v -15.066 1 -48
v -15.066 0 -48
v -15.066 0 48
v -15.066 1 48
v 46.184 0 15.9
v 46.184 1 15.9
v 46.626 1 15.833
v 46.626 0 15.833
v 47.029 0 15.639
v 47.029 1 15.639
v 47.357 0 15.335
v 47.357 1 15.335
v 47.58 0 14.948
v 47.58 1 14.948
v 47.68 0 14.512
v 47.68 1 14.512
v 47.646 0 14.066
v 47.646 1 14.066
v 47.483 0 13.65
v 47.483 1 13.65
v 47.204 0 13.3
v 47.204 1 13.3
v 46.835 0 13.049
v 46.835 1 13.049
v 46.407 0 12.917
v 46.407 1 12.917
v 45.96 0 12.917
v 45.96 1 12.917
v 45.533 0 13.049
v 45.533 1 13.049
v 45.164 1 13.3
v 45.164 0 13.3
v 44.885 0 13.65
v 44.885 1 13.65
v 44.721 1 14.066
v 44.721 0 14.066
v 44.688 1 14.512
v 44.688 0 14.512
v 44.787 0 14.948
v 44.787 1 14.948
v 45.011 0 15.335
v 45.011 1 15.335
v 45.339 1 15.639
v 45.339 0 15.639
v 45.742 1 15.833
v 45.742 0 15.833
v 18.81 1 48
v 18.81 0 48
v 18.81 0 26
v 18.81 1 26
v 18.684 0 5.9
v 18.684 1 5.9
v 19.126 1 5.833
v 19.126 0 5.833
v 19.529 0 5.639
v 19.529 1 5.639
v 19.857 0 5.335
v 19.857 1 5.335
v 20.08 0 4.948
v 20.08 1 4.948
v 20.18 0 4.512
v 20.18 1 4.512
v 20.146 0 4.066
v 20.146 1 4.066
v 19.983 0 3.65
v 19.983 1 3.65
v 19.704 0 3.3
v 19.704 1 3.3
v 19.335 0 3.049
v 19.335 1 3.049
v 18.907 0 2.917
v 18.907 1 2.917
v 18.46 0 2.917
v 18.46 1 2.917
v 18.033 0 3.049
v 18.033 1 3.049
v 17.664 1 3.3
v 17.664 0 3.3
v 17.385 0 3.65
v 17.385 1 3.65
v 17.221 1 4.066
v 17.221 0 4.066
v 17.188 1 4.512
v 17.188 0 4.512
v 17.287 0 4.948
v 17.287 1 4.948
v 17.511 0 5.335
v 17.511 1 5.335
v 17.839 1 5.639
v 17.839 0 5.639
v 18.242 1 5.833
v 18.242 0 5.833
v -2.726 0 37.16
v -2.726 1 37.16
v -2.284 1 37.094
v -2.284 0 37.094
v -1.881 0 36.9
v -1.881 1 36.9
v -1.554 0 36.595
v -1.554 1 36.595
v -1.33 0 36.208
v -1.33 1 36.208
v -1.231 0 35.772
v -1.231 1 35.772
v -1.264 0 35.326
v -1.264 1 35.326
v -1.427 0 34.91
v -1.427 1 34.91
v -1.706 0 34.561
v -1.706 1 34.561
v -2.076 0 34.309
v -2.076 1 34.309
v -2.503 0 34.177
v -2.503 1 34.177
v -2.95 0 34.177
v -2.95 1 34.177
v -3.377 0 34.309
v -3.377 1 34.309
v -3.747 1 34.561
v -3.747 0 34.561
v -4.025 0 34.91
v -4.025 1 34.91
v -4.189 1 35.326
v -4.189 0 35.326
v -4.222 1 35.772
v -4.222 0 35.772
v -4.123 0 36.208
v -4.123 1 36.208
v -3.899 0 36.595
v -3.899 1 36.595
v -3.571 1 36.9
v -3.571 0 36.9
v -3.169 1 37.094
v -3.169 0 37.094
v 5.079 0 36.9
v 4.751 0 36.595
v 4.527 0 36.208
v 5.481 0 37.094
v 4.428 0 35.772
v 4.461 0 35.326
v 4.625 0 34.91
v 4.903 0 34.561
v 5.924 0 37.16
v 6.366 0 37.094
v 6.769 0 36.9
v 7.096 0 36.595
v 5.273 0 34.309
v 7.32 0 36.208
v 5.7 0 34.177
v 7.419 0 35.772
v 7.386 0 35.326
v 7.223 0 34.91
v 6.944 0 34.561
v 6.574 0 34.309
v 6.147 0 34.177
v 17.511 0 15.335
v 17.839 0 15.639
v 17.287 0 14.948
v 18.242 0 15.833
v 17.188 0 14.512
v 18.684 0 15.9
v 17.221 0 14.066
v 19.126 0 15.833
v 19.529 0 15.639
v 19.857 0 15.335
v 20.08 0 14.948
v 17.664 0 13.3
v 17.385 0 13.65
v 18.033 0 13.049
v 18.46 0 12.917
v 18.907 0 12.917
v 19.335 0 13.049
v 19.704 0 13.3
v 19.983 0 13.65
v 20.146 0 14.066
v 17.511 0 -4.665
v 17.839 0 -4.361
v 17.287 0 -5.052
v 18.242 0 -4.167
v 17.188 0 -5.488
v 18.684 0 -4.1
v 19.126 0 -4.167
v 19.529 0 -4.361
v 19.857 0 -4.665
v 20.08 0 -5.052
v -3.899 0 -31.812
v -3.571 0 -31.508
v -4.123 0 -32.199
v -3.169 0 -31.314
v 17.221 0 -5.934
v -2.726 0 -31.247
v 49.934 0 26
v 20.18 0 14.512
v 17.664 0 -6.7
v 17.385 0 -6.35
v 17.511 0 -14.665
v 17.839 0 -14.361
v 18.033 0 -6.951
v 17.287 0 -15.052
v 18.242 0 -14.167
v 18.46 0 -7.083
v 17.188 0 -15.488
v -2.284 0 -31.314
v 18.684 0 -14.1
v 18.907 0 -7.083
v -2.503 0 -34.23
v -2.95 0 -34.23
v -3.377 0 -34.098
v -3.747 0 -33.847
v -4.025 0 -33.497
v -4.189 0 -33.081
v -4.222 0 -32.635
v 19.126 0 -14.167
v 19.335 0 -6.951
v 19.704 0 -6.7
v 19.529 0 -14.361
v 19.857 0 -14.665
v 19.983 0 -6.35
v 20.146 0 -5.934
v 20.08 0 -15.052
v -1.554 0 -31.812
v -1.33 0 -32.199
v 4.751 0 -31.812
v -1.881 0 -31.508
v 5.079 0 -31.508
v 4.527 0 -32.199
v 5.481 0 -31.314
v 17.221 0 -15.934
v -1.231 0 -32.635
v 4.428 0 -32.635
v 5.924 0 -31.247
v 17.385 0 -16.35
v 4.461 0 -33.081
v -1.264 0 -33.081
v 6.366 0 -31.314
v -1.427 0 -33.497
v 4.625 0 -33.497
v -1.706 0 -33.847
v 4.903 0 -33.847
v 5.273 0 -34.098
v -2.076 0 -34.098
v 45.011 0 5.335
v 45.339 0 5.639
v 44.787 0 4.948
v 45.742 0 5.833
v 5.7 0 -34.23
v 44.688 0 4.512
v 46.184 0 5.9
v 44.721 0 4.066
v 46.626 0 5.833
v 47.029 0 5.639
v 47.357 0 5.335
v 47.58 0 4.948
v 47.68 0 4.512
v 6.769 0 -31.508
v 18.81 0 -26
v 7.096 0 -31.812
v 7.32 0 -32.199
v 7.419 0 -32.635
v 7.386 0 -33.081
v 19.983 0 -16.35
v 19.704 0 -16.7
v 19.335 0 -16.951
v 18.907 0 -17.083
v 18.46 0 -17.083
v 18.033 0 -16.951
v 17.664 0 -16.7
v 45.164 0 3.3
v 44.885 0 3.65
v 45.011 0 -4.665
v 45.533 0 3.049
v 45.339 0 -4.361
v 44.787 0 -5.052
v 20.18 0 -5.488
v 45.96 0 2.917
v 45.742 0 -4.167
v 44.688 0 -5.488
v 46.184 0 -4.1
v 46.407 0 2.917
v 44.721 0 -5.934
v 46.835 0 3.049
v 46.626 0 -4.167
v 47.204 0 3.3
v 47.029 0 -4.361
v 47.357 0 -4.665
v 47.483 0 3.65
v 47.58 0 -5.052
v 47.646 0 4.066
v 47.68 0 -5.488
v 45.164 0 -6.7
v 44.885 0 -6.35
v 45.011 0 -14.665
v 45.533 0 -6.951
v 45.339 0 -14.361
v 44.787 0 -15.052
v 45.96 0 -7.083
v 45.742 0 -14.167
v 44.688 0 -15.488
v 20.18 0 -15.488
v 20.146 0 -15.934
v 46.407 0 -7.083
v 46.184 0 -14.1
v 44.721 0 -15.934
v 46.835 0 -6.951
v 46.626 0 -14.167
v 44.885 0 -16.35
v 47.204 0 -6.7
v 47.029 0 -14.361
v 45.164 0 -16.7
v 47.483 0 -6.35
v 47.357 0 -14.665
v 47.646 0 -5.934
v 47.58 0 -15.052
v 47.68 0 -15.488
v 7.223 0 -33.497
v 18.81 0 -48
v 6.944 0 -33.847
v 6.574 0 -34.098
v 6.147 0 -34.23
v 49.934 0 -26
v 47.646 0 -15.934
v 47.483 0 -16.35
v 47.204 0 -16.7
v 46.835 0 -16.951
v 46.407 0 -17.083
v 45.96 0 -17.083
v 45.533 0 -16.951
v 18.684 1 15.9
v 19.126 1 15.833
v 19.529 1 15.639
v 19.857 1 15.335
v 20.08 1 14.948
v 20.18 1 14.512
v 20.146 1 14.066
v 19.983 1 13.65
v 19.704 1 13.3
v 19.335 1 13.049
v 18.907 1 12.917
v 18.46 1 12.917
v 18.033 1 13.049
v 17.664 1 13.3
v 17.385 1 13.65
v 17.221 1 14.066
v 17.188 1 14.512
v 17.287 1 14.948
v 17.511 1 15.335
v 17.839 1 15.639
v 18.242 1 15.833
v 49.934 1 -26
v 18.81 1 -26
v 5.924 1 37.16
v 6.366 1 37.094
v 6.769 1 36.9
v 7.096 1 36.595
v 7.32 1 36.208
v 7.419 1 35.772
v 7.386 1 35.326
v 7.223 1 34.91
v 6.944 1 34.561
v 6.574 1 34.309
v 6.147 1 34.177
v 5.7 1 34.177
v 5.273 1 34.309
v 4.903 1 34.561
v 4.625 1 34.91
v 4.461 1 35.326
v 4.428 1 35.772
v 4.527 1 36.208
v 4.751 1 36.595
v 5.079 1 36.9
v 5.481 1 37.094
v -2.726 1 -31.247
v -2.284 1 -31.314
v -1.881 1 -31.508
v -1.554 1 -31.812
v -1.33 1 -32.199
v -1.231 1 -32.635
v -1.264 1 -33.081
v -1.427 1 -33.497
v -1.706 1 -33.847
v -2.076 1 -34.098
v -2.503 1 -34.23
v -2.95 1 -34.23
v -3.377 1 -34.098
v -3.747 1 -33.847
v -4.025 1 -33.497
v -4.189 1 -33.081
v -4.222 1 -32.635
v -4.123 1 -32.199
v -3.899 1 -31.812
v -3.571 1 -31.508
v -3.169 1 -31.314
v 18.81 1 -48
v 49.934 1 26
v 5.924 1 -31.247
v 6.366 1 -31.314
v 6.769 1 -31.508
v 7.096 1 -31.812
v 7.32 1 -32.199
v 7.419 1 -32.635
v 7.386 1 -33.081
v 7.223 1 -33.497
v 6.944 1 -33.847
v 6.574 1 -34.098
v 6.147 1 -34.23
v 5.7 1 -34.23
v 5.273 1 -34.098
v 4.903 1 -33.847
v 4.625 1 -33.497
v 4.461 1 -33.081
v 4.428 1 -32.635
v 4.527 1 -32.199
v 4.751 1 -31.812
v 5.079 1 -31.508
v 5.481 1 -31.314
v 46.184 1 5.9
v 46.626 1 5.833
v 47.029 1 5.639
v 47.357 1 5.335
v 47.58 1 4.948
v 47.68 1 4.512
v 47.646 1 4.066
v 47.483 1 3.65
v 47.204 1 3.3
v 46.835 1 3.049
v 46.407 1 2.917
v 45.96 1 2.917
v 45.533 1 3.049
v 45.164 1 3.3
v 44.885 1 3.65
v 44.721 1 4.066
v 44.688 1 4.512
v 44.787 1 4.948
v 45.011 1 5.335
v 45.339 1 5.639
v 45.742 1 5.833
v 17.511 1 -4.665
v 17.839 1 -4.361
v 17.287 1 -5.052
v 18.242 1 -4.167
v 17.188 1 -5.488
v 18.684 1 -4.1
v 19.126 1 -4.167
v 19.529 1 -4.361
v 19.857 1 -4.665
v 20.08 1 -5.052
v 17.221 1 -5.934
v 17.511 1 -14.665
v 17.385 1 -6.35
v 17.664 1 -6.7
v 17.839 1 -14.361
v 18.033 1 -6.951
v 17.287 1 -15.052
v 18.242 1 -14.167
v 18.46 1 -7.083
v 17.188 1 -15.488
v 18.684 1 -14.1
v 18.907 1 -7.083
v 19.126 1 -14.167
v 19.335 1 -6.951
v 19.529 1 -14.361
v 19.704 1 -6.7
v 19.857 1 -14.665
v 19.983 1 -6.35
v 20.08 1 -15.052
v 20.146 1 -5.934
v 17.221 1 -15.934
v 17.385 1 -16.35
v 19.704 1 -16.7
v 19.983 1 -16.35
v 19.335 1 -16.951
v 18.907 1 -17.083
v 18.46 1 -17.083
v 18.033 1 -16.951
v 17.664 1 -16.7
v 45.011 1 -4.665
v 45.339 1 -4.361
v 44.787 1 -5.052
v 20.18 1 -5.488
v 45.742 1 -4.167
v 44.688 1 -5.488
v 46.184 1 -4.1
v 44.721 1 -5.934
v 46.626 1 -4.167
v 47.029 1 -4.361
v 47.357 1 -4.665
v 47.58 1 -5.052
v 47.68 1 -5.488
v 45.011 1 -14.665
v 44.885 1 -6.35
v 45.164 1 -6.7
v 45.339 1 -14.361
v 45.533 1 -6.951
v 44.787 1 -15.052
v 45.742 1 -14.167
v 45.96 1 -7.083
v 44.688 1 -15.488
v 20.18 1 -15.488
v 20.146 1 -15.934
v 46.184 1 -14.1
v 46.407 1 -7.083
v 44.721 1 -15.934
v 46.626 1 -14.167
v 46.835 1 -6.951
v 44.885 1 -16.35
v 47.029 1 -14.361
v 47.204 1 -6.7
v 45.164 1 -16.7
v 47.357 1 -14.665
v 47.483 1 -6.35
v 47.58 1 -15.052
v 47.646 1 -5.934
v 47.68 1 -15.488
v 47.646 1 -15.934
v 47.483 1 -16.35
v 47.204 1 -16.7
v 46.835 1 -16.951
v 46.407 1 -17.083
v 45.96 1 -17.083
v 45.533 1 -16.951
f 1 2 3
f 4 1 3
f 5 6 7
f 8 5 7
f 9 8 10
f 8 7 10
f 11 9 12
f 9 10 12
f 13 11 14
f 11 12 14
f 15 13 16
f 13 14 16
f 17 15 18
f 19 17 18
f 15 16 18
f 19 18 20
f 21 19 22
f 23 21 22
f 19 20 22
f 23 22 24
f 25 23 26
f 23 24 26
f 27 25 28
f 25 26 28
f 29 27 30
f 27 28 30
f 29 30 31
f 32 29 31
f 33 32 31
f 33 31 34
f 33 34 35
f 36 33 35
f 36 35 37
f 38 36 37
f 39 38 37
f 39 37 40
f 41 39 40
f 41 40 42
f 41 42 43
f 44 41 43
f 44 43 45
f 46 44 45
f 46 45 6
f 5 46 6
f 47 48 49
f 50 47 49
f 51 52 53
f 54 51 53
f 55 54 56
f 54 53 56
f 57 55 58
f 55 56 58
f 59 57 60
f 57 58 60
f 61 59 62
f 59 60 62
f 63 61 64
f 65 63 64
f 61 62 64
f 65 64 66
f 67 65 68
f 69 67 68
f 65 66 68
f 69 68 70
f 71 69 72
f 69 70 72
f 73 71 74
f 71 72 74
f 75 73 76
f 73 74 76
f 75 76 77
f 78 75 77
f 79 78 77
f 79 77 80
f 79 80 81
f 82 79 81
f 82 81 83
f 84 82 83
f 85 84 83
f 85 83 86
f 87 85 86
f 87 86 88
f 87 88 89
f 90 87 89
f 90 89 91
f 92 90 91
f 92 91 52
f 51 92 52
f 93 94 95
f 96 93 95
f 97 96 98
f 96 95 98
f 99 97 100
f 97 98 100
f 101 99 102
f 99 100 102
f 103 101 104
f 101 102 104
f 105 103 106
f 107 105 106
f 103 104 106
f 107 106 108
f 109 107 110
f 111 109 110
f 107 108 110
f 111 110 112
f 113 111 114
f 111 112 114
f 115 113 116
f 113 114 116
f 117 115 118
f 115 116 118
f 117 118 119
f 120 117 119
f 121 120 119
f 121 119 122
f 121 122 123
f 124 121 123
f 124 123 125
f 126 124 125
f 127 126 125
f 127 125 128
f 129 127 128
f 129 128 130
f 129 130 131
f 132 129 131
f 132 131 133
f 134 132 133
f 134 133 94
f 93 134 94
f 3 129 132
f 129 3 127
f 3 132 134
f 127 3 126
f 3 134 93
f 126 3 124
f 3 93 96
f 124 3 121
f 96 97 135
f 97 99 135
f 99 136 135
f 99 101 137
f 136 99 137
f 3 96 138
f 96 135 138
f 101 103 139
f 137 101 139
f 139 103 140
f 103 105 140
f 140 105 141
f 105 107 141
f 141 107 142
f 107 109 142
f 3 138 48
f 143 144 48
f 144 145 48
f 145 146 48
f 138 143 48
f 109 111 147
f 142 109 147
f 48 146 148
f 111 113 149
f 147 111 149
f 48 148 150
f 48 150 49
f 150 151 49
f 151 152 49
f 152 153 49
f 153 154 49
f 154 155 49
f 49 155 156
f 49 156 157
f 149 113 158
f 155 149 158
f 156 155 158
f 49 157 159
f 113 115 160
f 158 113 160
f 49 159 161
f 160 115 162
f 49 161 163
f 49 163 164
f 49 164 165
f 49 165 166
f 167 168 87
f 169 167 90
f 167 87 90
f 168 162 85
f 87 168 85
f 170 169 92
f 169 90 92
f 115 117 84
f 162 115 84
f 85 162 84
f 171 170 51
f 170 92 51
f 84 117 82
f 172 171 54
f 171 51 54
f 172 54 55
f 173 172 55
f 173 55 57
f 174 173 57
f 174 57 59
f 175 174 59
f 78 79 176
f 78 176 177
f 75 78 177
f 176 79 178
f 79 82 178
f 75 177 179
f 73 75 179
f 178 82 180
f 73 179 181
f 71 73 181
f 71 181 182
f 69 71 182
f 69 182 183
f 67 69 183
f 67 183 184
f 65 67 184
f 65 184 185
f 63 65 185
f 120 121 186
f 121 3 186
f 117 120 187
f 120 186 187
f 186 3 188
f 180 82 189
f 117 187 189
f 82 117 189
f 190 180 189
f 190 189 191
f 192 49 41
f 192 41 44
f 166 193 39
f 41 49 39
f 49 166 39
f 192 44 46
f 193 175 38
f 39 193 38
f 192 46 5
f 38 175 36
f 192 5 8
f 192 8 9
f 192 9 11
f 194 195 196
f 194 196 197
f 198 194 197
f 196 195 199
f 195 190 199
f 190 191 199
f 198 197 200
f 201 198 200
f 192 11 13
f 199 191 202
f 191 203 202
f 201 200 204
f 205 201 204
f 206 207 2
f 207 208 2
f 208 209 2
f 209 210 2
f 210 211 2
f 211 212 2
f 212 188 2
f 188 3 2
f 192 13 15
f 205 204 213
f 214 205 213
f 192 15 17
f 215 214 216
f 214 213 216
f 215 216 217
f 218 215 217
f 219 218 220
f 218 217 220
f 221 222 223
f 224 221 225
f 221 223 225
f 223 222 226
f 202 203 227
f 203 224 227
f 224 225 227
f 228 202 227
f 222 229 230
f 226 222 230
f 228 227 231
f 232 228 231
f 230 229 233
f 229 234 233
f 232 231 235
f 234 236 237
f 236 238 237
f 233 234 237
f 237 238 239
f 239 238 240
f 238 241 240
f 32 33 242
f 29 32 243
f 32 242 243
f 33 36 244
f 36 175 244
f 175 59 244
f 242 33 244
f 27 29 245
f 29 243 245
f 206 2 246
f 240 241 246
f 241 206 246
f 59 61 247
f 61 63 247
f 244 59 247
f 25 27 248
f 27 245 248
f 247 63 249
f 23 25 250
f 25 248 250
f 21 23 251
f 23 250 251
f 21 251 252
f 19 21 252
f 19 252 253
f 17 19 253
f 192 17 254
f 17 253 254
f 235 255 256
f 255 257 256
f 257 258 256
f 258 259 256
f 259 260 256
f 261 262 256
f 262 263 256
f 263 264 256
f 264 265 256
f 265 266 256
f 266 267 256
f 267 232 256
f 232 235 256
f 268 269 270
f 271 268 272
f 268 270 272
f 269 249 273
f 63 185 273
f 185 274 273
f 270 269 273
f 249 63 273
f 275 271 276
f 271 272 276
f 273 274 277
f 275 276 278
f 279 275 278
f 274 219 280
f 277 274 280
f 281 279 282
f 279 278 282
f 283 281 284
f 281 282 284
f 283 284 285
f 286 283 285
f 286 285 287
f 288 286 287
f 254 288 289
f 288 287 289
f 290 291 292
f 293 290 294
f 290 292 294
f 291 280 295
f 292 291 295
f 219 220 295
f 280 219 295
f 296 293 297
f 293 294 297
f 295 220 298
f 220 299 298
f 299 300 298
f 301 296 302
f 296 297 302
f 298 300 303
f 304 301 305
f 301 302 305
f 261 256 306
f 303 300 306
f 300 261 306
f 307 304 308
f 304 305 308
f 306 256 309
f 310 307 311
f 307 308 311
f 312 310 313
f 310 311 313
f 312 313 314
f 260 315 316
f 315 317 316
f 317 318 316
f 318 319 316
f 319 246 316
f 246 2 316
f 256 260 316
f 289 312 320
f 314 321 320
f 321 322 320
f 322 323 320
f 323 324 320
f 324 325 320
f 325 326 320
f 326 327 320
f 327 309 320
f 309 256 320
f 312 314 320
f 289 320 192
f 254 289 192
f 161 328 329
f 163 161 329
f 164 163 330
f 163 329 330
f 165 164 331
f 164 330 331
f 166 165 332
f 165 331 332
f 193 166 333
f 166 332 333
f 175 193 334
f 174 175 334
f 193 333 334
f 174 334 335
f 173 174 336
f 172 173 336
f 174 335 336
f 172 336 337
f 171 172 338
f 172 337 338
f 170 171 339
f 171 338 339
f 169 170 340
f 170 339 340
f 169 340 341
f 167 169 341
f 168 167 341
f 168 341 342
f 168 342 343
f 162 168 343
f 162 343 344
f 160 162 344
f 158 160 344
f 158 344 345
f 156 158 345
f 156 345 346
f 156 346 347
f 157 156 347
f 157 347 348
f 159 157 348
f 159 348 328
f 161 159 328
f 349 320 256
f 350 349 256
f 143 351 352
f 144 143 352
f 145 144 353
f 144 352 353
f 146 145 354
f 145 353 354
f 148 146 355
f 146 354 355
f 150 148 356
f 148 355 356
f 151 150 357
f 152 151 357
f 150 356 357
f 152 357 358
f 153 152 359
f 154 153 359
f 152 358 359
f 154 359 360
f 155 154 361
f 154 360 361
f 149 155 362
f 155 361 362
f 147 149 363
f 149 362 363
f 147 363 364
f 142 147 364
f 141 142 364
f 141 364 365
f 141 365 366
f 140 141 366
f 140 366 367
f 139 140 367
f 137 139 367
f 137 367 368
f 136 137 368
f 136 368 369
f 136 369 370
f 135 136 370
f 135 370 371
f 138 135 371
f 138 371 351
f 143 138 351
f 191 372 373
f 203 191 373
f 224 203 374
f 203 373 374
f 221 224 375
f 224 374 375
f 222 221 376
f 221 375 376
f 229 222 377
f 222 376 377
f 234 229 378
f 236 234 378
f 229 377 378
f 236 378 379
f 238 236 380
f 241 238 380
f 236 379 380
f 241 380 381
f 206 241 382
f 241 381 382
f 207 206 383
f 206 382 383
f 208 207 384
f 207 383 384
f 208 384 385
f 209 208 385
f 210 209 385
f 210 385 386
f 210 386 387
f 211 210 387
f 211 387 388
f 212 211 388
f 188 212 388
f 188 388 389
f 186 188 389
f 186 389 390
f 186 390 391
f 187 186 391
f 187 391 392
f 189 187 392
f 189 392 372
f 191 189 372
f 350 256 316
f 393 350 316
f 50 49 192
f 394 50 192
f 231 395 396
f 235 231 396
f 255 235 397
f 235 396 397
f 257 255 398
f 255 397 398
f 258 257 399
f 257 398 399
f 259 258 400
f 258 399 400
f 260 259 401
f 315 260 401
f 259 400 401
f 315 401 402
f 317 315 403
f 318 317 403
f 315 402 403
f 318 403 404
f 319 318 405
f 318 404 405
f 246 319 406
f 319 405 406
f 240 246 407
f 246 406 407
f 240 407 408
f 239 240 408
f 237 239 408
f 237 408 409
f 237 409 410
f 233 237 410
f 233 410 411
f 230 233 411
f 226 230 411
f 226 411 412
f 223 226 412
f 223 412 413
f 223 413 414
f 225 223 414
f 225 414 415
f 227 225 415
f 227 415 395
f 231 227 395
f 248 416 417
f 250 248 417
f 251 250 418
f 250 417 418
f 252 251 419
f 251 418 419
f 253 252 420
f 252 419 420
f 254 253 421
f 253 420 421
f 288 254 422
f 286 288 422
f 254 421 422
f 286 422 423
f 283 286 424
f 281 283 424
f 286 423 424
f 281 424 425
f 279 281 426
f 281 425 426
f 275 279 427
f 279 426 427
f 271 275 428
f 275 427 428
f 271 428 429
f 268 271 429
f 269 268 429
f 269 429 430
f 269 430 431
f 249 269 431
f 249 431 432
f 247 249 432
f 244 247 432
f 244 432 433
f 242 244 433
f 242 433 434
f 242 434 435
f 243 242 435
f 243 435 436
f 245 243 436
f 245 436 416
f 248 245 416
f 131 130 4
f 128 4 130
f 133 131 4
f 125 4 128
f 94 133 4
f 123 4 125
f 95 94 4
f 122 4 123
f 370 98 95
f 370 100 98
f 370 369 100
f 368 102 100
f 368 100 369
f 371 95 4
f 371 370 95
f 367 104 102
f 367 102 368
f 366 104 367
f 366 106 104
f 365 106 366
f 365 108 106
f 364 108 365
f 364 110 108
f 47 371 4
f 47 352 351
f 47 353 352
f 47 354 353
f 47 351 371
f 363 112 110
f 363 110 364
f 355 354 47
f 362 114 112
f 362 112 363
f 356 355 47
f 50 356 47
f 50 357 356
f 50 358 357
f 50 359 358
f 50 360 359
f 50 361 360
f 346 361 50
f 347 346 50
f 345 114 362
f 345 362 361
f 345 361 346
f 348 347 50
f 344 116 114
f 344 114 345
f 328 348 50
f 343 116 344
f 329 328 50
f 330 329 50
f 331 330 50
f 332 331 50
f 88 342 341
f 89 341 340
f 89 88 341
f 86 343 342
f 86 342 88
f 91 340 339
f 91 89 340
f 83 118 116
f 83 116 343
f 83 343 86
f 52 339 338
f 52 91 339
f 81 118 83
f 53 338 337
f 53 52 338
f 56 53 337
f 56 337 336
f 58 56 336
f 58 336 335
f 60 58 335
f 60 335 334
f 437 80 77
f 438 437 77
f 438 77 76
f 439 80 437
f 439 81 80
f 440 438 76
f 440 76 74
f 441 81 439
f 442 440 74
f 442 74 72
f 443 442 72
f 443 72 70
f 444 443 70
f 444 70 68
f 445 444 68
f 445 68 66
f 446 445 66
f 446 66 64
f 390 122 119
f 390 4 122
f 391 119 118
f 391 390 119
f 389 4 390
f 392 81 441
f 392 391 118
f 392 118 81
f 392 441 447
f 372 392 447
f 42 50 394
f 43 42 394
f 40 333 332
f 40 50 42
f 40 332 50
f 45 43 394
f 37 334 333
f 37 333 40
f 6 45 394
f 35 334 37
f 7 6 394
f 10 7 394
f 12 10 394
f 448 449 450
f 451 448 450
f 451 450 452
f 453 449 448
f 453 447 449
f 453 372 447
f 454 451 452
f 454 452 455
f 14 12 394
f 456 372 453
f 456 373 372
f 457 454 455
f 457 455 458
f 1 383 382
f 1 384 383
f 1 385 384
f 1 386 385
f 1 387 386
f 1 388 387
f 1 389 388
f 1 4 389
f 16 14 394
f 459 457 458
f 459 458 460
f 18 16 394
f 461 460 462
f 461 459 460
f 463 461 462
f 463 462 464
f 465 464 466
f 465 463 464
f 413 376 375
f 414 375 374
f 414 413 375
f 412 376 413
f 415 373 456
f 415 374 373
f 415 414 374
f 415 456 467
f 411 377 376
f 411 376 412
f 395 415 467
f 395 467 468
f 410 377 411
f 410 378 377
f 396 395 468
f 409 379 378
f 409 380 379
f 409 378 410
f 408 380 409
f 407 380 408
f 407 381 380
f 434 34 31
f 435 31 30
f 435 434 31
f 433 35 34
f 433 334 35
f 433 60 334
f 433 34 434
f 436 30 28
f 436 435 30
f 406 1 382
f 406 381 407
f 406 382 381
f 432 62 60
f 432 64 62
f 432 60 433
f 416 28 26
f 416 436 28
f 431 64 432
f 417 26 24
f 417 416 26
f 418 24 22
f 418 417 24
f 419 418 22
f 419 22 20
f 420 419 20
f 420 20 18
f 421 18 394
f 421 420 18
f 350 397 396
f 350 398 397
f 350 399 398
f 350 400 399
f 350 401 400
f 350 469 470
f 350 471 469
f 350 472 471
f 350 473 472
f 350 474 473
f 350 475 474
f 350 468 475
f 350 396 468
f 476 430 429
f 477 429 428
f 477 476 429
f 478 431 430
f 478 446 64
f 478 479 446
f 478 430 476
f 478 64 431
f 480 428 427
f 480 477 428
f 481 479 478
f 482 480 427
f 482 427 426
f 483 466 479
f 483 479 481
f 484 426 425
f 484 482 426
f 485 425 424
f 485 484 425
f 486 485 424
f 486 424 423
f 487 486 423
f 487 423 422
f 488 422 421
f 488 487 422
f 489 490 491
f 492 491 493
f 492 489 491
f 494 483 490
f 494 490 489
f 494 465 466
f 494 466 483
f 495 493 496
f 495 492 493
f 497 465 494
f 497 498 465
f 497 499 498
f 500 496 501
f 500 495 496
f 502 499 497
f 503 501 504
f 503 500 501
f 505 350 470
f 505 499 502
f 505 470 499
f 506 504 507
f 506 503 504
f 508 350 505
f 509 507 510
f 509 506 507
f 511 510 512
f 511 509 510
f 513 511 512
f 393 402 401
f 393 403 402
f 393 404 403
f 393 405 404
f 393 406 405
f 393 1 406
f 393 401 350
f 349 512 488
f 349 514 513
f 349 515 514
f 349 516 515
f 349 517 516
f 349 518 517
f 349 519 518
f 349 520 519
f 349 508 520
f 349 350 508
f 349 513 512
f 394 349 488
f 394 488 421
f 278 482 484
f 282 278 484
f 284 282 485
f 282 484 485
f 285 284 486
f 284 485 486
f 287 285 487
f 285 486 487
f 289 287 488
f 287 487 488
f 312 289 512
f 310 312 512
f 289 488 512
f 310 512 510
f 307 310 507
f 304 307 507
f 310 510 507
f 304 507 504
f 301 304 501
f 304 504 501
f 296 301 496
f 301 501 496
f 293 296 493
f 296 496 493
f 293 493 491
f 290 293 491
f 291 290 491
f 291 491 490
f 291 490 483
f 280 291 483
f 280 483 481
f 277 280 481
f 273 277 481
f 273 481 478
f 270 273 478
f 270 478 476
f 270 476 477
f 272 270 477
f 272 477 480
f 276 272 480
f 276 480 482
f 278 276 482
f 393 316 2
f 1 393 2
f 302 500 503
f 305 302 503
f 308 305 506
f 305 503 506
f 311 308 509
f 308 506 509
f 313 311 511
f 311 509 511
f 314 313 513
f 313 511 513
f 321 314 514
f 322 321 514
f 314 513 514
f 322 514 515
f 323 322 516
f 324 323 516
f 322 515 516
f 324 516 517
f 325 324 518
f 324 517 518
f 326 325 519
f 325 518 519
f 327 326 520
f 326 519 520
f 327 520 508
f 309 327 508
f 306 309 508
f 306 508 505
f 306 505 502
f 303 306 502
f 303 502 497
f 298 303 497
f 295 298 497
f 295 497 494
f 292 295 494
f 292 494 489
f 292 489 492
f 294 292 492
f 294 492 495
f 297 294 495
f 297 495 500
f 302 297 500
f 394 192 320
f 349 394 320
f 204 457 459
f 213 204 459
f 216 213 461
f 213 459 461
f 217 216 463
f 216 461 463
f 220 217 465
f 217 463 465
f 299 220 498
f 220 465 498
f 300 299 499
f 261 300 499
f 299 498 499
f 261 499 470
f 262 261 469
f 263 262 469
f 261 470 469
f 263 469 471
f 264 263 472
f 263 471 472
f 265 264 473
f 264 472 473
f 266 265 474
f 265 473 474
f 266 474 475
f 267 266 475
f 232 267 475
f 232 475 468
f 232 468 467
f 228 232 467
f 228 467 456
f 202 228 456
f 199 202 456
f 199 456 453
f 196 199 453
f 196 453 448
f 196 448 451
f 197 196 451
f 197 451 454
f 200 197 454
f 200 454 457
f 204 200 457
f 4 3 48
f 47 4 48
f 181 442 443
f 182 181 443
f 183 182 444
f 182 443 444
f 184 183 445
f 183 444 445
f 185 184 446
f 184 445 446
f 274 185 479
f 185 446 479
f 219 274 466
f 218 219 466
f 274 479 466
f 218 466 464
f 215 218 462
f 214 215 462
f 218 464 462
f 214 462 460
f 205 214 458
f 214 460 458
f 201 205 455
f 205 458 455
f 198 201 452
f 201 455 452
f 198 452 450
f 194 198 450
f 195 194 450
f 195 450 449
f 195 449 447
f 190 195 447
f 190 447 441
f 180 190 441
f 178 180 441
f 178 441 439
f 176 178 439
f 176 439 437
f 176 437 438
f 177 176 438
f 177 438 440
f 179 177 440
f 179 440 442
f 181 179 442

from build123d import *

# Parameters (mm, degrees)
SKETCH_1_W          = 17.893001423
SKETCH_1_H          = 11.620982588
SKETCH_1_H_2        = 11.620982589
EXTRUDE_1_DEPTH     = 1
SKETCH_2_R          = 1.5
CUT_EXTRUDE_1_DEPTH = 10
SKETCH_3_R          = 1.5
CUT_EXTRUDE_2_DEPTH = 10
SKETCH_4_W          = 33.892879225
SKETCH_4_H          = 96
CUT_EXTRUDE_3_DEPTH = 10


with BuildPart() as part:
    # Эскиз1 → Бобышка-Вытянуть1 (new body)
    with BuildSketch(Plane(origin=(0, 0, 0), x_dir=(1, 0, 0), z_dir=(0, 1, 0))):
        Polygon((49.933797981, 26), (18.809932441, 26), (18.809932441, 48), (15, 48), (-48.959081244, 48), (-48.959081244, -48), (15, -48), (18.809932441, -48), (18.809932441, -26), (49.933797981, -26), align=None)
        with Locations((-36.319088007, -31.12001489)):
            Rectangle(SKETCH_1_W, SKETCH_1_H, mode=Mode.SUBTRACT)
        with Locations((-36.319088007, 31.12001489)):
            Rectangle(SKETCH_1_W, SKETCH_1_H_2, mode=Mode.SUBTRACT)
    extrude(amount=EXTRUDE_1_DEPTH)

    # Эскиз2 → Вырез-Вытянуть1 (cut)
    with BuildSketch(Plane(origin=(0, 1, 0), x_dir=(1, 0, 0), z_dir=(0, 1, 0))):
        with Locations(Location((46.183797981, -14.4, 0), (0, 0, 270))):
            Circle(SKETCH_2_R)
        with Locations(Location((18.683797981, -14.4, 0), (0, 0, 270))):
            Circle(SKETCH_2_R)
        with Locations(Location((18.683797981, -4.4, 0), (0, 0, 270))):
            Circle(SKETCH_2_R)
        with Locations(Location((46.183797981, -4.4, 0), (0, 0, 270))):
            Circle(SKETCH_2_R)
        with Locations(Location((18.683797981, 5.6, 0), (0, 0, 270))):
            Circle(SKETCH_2_R)
        with Locations(Location((46.183797981, 5.6, 0), (0, 0, 270))):
            Circle(SKETCH_2_R)
        with Locations(Location((18.683797981, 15.6, 0), (0, 0, 270))):
            Circle(SKETCH_2_R)
        with Locations(Location((46.183797981, 15.6, 0), (0, 0, 270))):
            Circle(SKETCH_2_R)
    extrude(amount=-CUT_EXTRUDE_1_DEPTH, mode=Mode.SUBTRACT)

    # Эскиз3 → Вырез-Вытянуть2 (cut)
    with BuildSketch(Plane(origin=(0, 1, 0), x_dir=(1, 0, 0), z_dir=(0, 1, 0))):
        with Locations(Location((5.923569009, 32.746976788, 0), (0, 0, 270))):
            Circle(SKETCH_3_R)
        with Locations(Location((-2.726430991, 32.746976788, 0), (0, 0, 270))):
            Circle(SKETCH_3_R)
        with Locations(Location((-2.726430991, -35.660220789, 0), (0, 0, 270))):
            Circle(SKETCH_3_R)
        with Locations(Location((5.923569009, -35.660220789, 0), (0, 0, 270))):
            Circle(SKETCH_3_R)
    extrude(amount=-CUT_EXTRUDE_2_DEPTH, mode=Mode.SUBTRACT)

    # Эскиз4 → Вырез-Вытянуть3 (cut)
    with BuildSketch(Plane.XZ):
        with Locations((-32.012641632, 0)):
            Rectangle(SKETCH_4_W, SKETCH_4_H)
    extrude(amount=-CUT_EXTRUDE_3_DEPTH, mode=Mode.SUBTRACT)


solid = part.part
